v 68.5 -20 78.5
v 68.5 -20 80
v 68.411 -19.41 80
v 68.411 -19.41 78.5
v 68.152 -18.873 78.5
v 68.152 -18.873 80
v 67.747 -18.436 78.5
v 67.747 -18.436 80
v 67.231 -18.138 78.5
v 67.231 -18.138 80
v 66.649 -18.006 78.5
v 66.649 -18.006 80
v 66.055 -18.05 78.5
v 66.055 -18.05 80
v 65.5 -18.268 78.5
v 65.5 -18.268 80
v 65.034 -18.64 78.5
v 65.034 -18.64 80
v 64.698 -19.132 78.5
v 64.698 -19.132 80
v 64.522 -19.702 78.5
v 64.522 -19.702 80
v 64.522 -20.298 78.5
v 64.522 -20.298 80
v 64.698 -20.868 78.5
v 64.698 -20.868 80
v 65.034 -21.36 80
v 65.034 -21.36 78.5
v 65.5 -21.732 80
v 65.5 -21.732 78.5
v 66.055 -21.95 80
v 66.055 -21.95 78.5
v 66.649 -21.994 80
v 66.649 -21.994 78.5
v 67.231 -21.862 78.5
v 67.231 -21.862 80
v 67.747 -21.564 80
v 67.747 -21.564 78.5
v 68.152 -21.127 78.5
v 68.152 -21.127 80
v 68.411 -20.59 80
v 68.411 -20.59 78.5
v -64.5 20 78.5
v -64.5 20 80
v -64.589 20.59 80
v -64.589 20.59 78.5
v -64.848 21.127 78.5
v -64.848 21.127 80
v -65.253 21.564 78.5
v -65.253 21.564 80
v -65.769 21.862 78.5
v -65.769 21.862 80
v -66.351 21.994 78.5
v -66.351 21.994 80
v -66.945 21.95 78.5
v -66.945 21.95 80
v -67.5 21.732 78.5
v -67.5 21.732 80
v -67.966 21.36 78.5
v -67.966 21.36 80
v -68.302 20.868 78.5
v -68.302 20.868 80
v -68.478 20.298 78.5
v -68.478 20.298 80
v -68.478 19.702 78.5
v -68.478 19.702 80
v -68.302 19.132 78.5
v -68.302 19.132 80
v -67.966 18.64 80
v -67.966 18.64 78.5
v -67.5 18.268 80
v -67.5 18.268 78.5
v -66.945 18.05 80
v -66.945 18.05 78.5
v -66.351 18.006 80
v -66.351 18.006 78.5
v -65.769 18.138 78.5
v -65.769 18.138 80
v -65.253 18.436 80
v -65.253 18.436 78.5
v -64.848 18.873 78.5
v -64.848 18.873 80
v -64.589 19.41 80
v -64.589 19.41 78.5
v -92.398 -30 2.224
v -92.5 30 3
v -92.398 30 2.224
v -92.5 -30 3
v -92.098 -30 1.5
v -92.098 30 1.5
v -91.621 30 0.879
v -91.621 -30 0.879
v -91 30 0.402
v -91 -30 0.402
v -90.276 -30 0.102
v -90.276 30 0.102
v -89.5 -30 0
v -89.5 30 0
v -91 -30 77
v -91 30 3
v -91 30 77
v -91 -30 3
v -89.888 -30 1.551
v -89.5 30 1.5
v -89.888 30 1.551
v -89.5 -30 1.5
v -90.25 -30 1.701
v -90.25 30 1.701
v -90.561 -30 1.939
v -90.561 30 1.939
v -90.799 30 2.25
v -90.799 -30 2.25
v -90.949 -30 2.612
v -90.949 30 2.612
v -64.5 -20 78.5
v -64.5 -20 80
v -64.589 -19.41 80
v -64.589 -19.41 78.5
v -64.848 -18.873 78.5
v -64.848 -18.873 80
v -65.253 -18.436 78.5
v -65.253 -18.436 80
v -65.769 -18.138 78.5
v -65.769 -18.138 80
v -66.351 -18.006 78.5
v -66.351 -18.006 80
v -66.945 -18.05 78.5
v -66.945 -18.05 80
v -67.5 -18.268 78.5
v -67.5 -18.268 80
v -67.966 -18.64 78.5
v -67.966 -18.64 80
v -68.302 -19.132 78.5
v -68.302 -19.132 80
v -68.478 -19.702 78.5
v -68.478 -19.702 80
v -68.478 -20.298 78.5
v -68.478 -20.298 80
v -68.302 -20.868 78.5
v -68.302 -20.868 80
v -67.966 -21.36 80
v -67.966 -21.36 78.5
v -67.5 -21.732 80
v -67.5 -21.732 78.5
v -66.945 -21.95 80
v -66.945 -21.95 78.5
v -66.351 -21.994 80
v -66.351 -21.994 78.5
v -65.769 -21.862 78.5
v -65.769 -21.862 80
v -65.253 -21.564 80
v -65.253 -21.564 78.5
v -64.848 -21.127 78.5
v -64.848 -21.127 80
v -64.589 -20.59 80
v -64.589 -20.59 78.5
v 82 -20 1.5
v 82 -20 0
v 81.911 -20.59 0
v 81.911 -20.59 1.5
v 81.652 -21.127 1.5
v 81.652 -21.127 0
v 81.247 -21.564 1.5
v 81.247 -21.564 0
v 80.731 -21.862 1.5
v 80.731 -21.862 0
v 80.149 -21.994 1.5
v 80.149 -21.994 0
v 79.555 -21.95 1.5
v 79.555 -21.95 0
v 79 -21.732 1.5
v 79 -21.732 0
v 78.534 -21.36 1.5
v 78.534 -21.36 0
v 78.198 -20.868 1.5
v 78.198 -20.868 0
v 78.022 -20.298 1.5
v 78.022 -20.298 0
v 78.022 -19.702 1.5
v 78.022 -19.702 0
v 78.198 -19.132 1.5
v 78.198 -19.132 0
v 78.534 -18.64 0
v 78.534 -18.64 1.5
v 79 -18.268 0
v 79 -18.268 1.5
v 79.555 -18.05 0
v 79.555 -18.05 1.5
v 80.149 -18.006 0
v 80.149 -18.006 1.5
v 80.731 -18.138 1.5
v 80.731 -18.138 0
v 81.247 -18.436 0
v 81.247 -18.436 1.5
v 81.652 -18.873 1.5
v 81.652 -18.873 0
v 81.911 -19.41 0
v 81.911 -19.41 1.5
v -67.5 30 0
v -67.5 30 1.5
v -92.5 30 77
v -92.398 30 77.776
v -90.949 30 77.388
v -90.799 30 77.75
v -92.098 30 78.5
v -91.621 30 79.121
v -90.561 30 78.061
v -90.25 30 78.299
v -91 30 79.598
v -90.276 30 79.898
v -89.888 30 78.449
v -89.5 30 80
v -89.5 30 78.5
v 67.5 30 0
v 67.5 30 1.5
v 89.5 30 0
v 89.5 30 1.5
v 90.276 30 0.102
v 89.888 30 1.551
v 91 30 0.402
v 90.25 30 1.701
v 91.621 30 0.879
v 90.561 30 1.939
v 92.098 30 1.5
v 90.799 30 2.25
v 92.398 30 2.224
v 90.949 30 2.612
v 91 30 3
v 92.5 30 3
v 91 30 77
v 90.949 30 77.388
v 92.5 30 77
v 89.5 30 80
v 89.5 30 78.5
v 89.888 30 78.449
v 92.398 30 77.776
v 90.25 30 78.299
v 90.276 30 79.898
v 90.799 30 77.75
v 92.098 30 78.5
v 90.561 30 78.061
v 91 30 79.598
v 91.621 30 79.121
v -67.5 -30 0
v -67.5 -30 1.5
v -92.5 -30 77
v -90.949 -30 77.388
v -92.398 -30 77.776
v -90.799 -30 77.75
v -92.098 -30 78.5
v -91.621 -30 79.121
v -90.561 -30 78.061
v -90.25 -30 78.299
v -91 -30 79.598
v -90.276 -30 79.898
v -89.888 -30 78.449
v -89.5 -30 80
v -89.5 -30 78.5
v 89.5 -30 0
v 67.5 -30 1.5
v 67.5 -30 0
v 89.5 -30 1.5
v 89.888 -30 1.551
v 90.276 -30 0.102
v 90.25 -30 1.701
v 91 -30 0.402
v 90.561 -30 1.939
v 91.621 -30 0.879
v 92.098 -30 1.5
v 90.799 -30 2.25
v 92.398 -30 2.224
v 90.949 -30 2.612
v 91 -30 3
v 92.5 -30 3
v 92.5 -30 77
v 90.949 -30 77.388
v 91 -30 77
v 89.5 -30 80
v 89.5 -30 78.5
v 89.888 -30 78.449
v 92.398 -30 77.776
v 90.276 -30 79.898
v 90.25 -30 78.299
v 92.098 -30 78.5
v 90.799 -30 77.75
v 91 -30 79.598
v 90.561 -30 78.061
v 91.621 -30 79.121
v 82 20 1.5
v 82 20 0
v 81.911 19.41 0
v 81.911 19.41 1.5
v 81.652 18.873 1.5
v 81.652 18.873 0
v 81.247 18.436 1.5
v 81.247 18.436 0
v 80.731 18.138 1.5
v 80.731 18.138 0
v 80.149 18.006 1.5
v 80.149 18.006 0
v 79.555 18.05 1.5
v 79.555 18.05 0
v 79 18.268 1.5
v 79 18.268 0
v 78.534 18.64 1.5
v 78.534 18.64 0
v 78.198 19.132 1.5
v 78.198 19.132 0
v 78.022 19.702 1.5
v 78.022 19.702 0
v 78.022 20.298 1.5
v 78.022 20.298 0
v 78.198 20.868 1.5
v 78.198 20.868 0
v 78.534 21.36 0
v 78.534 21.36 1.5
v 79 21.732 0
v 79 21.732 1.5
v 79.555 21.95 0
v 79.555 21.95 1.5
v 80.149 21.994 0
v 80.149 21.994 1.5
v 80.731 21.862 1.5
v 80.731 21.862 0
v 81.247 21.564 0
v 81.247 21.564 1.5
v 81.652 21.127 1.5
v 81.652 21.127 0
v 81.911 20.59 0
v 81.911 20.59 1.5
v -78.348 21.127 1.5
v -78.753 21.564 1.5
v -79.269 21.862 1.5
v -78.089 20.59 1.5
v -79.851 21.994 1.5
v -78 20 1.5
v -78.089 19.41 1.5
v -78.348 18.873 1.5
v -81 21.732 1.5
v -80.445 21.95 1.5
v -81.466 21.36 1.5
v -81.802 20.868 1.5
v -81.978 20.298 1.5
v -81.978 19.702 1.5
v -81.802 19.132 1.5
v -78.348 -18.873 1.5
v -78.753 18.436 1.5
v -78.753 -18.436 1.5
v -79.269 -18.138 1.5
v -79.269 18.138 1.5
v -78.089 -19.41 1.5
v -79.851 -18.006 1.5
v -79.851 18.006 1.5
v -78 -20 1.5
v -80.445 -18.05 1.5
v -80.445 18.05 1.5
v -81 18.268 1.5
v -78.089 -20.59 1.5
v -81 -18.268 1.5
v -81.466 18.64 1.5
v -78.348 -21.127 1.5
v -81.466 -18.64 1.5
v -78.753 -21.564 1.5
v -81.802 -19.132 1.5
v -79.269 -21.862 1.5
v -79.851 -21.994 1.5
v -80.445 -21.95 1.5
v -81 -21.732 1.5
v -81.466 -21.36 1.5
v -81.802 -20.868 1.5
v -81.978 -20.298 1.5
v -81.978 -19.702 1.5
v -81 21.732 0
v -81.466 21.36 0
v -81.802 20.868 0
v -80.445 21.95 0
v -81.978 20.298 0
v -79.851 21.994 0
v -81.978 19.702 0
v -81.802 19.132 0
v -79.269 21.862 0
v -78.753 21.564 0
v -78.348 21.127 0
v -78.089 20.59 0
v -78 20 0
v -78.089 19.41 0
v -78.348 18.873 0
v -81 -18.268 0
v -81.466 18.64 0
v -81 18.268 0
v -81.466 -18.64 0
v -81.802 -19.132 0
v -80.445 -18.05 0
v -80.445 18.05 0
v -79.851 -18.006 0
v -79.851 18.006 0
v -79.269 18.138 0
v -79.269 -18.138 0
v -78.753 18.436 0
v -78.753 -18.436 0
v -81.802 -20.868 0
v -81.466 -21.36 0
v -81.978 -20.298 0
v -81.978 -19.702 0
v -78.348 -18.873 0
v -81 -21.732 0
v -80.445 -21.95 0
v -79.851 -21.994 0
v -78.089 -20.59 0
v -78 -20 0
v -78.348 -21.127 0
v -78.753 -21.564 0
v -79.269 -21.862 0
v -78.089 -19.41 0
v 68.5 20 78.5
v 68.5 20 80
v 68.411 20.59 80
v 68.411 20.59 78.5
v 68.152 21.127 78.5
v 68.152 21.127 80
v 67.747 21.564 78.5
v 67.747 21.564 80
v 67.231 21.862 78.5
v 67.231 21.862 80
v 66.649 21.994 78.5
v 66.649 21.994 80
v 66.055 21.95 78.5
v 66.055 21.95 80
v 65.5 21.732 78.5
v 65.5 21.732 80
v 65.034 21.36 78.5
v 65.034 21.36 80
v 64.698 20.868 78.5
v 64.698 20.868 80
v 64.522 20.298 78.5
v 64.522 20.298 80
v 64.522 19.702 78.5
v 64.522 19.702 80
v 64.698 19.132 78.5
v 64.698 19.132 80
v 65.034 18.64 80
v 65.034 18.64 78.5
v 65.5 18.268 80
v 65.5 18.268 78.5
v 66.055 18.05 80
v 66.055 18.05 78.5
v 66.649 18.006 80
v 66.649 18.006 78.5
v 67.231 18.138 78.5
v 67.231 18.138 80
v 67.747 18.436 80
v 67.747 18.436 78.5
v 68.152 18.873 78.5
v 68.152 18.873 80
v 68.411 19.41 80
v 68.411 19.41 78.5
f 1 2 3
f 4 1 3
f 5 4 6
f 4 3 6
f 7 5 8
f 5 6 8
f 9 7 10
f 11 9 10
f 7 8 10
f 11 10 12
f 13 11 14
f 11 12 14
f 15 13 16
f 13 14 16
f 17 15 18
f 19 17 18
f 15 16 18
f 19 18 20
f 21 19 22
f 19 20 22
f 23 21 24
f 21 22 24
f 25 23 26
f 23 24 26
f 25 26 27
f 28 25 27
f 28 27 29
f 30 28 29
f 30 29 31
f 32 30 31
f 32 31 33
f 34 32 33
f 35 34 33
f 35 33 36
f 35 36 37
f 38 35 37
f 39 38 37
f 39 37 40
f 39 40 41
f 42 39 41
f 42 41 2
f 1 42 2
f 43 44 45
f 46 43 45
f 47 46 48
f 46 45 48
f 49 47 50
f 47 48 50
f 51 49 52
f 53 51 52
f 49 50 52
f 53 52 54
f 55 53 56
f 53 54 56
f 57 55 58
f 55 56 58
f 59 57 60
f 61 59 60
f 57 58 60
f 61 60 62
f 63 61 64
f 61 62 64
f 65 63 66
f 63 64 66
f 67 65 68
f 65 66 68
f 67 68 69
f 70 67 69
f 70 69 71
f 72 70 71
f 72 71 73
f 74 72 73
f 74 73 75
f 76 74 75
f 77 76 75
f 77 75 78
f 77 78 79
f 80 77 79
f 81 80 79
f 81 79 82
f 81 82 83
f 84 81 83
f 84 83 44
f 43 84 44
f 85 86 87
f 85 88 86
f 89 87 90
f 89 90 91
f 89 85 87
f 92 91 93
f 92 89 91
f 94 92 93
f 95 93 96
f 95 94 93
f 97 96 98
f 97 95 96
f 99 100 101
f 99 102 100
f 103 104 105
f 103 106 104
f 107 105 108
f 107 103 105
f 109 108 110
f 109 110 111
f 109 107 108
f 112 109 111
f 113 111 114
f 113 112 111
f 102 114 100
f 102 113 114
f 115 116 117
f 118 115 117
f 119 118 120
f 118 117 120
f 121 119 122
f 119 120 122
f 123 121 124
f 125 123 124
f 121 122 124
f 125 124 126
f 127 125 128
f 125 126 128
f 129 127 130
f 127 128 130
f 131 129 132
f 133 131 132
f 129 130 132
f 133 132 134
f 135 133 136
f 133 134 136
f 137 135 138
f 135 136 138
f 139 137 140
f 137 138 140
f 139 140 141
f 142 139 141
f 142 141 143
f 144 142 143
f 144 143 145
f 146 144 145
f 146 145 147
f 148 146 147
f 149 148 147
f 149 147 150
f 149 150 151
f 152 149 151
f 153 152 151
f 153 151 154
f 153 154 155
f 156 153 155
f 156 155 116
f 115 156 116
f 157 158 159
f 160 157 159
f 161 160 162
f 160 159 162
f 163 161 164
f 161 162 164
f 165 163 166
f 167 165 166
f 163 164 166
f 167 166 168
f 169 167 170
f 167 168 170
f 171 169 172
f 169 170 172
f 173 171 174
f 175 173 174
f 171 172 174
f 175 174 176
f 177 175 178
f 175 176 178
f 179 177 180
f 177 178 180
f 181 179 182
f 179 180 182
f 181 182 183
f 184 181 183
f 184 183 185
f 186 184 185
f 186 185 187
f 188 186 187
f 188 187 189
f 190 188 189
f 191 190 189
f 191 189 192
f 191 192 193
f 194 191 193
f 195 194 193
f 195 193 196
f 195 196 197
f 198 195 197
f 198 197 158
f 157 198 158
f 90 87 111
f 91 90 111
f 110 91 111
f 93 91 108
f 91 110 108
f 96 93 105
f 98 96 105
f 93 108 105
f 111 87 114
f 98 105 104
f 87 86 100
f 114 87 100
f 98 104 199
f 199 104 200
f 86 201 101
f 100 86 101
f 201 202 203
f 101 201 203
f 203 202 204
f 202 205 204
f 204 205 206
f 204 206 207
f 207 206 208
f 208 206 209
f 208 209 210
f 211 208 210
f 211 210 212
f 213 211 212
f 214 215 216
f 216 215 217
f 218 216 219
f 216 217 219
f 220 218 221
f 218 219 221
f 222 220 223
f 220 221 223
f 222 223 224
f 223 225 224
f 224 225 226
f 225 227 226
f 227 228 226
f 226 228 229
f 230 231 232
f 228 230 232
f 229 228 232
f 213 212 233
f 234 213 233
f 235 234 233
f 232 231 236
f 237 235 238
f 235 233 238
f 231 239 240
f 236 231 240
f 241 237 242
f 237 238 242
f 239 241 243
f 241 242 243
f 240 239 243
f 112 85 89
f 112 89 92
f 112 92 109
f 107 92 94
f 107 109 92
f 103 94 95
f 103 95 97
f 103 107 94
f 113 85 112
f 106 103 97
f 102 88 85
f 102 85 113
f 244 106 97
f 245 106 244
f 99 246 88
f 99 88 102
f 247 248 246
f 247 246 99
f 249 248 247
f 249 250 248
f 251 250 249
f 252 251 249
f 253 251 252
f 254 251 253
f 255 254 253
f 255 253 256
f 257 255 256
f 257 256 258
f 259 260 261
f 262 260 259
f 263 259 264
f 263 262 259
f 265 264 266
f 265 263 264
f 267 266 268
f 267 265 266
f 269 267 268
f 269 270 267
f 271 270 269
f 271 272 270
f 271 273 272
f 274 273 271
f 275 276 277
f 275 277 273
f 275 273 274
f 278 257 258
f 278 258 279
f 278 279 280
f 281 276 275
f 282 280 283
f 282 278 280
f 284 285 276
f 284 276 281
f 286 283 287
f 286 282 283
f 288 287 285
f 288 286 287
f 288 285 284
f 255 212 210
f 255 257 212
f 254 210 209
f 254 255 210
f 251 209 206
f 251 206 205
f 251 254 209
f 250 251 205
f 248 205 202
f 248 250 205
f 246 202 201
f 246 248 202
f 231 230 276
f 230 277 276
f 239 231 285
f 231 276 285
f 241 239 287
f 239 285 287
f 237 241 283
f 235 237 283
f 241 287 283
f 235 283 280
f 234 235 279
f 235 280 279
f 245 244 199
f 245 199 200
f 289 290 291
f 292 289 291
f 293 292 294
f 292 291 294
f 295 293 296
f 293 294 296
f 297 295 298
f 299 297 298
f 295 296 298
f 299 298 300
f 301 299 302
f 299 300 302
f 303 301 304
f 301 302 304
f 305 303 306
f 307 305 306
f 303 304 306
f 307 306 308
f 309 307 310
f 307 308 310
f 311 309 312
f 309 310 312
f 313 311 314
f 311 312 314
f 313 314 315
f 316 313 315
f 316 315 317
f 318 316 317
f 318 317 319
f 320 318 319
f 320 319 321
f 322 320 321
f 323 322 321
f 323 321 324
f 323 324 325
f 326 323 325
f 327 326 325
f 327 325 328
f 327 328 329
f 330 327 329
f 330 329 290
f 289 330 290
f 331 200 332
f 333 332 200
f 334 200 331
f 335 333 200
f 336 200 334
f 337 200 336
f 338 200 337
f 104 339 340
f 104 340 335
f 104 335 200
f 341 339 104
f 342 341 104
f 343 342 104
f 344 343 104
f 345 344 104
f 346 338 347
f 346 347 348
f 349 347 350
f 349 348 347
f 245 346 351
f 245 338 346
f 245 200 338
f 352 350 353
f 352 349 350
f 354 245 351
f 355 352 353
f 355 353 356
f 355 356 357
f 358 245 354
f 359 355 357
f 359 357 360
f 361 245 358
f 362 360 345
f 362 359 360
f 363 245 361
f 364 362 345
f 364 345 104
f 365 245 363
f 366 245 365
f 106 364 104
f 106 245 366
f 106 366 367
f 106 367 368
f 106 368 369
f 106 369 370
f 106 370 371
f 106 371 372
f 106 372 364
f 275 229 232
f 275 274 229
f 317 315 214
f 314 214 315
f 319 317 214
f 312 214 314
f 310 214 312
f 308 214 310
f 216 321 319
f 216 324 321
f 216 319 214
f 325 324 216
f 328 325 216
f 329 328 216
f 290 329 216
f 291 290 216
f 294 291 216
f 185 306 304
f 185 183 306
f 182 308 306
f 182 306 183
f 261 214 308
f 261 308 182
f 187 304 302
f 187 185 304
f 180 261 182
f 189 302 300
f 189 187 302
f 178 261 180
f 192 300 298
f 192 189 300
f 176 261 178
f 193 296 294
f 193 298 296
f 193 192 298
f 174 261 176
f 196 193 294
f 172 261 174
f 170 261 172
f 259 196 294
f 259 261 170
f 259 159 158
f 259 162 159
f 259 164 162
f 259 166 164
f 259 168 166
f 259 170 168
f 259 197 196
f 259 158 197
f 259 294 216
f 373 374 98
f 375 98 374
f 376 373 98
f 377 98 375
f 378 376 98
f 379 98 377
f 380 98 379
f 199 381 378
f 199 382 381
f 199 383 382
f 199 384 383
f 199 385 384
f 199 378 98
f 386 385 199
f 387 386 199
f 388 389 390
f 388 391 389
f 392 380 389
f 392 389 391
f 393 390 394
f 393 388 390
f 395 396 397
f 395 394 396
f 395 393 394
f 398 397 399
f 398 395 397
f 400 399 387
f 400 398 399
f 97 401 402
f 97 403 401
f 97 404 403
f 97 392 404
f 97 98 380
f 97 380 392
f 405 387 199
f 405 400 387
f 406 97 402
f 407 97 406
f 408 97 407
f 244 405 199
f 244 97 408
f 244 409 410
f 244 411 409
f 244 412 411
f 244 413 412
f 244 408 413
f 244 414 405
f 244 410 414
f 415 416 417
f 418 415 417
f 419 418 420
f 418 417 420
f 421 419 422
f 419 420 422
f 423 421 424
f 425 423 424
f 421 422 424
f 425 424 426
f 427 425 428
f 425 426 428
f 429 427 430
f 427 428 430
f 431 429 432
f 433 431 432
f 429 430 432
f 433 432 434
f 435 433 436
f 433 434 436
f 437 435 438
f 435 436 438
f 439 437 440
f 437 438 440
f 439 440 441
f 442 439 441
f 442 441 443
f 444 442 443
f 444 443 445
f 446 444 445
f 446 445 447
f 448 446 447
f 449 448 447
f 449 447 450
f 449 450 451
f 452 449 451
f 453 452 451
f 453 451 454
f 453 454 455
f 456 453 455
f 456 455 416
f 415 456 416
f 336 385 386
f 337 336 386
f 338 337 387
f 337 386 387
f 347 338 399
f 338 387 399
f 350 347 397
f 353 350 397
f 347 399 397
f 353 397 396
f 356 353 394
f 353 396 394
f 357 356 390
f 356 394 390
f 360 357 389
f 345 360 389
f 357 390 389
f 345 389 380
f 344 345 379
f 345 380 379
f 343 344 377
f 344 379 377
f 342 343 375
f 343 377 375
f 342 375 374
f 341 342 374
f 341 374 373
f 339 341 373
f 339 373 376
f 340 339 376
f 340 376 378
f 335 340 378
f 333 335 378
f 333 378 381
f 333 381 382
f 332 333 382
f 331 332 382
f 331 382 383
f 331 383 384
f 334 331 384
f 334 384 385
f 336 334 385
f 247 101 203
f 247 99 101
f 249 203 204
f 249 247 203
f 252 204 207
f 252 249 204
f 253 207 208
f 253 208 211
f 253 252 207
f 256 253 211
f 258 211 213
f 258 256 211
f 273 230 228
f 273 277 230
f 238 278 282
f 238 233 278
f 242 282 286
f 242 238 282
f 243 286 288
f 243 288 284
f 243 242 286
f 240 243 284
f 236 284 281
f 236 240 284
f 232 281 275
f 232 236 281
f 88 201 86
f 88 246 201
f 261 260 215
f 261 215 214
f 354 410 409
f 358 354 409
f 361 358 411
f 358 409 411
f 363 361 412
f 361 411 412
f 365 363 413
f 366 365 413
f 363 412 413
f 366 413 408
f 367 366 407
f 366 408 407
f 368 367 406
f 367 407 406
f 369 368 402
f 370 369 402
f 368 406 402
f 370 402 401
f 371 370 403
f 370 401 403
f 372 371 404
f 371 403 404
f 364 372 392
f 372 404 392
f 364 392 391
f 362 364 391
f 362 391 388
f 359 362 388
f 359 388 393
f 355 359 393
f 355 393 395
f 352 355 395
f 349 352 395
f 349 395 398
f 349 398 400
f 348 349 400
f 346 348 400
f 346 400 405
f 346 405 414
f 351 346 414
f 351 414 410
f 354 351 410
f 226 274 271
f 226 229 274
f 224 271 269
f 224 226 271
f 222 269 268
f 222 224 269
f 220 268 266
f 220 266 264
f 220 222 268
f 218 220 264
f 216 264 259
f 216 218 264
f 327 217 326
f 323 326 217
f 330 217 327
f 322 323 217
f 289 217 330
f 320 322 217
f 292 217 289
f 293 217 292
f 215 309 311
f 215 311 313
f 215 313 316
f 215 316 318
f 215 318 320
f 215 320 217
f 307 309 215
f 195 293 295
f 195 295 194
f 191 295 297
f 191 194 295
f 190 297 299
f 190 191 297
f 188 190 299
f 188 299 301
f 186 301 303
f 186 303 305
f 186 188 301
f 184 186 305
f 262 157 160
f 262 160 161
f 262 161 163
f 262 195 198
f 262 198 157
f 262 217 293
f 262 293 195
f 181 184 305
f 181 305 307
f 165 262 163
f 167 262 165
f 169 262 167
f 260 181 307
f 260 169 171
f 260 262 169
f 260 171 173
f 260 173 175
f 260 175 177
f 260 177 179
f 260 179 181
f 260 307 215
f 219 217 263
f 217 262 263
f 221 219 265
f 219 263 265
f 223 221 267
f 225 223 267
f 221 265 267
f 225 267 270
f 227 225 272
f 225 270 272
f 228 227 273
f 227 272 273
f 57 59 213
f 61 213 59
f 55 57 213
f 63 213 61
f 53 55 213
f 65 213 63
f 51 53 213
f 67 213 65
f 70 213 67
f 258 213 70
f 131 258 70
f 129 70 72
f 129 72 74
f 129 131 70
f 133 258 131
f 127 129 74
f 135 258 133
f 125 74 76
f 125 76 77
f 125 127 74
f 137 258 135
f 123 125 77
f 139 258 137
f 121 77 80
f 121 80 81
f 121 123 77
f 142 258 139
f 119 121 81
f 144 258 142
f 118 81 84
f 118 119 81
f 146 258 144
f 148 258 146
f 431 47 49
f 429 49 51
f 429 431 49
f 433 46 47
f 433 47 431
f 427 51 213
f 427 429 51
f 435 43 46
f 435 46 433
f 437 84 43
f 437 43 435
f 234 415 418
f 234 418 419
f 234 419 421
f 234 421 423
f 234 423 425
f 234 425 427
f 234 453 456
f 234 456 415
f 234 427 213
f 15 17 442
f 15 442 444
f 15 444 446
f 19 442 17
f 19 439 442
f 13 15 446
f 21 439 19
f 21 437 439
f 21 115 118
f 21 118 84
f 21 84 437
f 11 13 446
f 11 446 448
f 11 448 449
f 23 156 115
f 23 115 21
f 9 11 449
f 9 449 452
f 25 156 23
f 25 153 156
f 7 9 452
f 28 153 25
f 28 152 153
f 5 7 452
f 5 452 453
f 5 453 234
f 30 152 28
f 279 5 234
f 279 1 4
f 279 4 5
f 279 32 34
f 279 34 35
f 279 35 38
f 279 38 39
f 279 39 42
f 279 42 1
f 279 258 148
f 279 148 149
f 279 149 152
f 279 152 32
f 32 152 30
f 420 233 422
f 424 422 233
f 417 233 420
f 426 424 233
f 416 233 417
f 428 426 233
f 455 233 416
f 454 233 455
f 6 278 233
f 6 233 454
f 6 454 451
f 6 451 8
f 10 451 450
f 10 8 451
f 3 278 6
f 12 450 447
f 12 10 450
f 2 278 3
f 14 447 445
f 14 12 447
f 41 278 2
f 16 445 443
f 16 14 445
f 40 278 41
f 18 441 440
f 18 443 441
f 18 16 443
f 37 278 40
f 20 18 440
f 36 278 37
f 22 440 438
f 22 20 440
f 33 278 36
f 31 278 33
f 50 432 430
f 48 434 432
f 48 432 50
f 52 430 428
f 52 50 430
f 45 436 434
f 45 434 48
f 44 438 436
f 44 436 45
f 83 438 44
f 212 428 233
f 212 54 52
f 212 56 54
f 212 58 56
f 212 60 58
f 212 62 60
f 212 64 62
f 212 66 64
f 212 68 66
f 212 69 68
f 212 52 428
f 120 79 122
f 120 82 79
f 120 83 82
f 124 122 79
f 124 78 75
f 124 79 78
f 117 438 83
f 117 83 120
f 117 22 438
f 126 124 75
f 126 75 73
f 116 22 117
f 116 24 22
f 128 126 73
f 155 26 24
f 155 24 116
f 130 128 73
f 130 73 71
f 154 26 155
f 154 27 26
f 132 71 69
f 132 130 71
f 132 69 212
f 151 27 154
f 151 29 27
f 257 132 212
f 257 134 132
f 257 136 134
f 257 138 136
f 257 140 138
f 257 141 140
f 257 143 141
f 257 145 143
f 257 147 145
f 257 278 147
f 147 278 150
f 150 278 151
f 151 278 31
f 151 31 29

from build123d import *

# Parameters (mm, degrees)
F1_DEPTH = 30
F2_R     = 2
F3_DEPTH = 25
F4_R     = 2
F5_DEPTH = 10
F6_R     = 3
F7_R     = 1.5


with BuildPart() as f1:
    # F0 (on Front) → F1 (new body, symmetric)
    with BuildSketch(Plane.XZ):
        Polygon((92.5, 80), (0, 80), (-92.5, 80), (-92.5, 0), (-67.5, 0), (-67.5, 1.5), (-91, 1.5), (-91, 78.5), (0, 78.5), (91, 78.5), (91, 1.5), (67.5, 1.5), (67.5, 0), (92.5, 0), align=None)
    extrude(amount=F1_DEPTH, both=True)

    # F2 (on face) → F3 (cut)
    with BuildSketch(Plane.XY.offset(80)):
        with Locations((-66.5, 20)):
            Circle(F2_R)
        with Locations((-66.5, -20)):
            Circle(F2_R)
        with Locations((66.5, 20)):
            Circle(F2_R)
        with Locations((66.5, -20)):
            Circle(F2_R)
    extrude(amount=-F3_DEPTH, mode=Mode.SUBTRACT)

    # F4 (on face) → F5 (cut)
    with BuildSketch(Plane(origin=(0, 0, 0), x_dir=(1, 0, 0), z_dir=(0, 0, -1))):
        with Locations((-80, 20)):
            Circle(F4_R)
        with Locations((-80, -20)):
            Circle(F4_R)
        with Locations((80, -20)):
            Circle(F4_R)
        with Locations((80, 20)):
            Circle(F4_R)
    extrude(amount=-F5_DEPTH, mode=Mode.SUBTRACT)

    # F6
    f6_edges = [f1.edges().sort_by_distance(p)[0] for p in [
        (-92.5, 0, 80),
        (-92.5, 0, 0),
        (92.5, 0, 80),
        (92.5, 0, 0),
    ]]
    fillet(f6_edges, radius=F6_R)

    # F7
    f7_edges = [f1.edges().sort_by_distance(p)[0] for p in [
        (-91, 0, 78.5),
        (91, 0, 78.5),
        (-91, 0, 1.5),
        (91, 0, 1.5),
    ]]
    fillet(f7_edges, radius=F7_R)


solid = f1.part
